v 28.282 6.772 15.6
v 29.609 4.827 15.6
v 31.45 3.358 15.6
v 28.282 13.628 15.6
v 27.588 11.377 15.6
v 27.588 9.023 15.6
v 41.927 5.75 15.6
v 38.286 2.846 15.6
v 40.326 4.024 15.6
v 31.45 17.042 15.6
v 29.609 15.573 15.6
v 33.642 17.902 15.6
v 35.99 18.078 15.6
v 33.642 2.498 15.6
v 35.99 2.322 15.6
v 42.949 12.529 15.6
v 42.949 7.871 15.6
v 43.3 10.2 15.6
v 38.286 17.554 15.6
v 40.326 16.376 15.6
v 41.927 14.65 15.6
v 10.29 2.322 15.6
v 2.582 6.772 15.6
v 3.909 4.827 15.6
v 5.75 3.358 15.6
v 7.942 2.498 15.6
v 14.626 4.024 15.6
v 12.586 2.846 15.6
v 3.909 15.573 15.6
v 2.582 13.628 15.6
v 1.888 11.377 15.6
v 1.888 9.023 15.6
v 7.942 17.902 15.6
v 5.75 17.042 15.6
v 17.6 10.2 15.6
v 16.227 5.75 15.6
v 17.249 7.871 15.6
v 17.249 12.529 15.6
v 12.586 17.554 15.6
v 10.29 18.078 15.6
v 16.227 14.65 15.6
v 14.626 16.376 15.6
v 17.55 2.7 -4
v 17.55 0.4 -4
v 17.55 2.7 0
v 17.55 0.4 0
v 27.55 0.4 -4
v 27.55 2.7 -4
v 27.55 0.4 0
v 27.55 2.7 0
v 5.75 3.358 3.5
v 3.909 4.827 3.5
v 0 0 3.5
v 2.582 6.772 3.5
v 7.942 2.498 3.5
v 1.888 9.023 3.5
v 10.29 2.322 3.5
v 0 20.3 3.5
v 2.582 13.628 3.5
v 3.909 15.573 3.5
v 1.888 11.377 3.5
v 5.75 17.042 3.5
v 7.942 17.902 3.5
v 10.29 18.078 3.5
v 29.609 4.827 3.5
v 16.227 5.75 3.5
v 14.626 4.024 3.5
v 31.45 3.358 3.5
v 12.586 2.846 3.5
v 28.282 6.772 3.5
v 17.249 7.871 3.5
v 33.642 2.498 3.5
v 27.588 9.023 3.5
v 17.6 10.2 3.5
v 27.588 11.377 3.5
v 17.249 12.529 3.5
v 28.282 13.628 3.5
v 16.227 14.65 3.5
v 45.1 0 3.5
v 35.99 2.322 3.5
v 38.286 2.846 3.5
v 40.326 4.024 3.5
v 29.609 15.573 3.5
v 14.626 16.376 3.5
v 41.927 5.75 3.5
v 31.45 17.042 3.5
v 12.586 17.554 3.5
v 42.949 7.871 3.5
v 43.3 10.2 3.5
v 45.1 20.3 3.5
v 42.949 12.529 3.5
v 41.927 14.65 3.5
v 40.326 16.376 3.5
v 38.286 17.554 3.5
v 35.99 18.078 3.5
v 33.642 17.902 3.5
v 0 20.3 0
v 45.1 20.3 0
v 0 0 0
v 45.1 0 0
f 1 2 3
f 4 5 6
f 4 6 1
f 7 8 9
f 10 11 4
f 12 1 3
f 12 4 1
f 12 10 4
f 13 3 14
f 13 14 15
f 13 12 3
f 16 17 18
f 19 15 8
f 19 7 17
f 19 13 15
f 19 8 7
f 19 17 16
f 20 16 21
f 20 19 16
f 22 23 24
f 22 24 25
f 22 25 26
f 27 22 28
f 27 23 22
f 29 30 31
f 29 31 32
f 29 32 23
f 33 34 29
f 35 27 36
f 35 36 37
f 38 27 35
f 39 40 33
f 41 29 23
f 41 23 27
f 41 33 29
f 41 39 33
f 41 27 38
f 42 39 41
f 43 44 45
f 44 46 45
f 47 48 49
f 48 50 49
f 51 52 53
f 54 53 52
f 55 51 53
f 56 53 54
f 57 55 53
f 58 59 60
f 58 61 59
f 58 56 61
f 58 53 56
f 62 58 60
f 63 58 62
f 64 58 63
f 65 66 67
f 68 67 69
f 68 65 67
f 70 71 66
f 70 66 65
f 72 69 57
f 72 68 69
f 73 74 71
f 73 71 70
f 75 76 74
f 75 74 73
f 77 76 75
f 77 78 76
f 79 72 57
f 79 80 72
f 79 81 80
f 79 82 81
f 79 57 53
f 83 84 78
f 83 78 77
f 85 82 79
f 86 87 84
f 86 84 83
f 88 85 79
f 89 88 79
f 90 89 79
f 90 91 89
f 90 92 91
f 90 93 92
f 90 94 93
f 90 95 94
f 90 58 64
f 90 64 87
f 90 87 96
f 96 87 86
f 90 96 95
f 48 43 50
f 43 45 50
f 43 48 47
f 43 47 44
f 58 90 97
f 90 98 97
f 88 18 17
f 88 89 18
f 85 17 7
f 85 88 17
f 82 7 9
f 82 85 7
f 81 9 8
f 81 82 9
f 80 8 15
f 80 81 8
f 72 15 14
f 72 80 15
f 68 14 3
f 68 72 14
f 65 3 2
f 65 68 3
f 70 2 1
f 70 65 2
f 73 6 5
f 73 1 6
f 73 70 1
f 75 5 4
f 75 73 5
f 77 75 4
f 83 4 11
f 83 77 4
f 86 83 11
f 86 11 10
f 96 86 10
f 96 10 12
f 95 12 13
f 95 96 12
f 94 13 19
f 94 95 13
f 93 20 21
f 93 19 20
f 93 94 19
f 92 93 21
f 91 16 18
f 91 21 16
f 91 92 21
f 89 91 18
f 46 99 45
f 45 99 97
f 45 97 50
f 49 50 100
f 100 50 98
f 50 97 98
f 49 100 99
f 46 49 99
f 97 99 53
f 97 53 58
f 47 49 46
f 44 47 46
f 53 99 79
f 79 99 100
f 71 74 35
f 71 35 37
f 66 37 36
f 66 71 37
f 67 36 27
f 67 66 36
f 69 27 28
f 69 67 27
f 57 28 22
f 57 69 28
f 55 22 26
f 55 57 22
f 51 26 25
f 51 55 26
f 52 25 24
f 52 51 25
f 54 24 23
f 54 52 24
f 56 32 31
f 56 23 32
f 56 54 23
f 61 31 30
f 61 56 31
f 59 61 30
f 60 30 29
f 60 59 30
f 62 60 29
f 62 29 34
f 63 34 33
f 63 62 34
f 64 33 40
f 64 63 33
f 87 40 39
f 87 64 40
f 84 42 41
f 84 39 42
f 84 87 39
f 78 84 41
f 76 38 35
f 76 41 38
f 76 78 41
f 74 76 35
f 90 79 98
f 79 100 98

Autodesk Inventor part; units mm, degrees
ref_plane "YZ Plane" through (0, 0, 0) normal (1, 0, 0) x (0, 1, 0)
ref_plane "XZ Plane" through (0, 0, 0) normal (0, 1, 0) x (-1, 0, 0)
ref_plane "XY Plane" through (0, 0, 0) normal (0, 0, 1) x (1, 0, 0)
sketch "Skizze1" plane through (0, 0, 0) normal (0, 0, 1) x (1, 0, 0)
  line L0 (-9.02, 0) -> (54.12, 0) projected
  line L1 (0, -4.06) -> (0, 24.36) projected
  line L2 (0, 0) -> (45.1, 0)
  line L3 (45.1, 0) -> (45.1, 20.3)
  line L4 (45.1, 20.3) -> (0, 20.3)
  line L5 (0, 20.3) -> (0, 0)
  point P0 (0, 20.3)
  dimension "d0" = 20.3
  dimension "d1" = 45.1
extrude "Extrusion1" add sketch "Skizze1" along normal blind 3.5
sketch "Skizze2" plane through (0, 0, 3.5) normal (0, 0, 1) x (1, 0, 0)
  circle A0 centre (35.4, 10.2) radius 7.9
  circle A1 centre (9.7, 10.2) radius 7.9
  line L0 (0, 20.3) -> (0, 0) projected
  line L1 (0, 0) -> (45.1, 0) projected
  dimension "d4" = 15.8
  dimension "d5" = 15.8
  dimension "d6" = 25.7
  dimension "d8" = 9.7
  dimension "d9" = 10.2
  dimension "d10" = 10.2
extrude "Extrusion2" add sketch "Skizze2" along normal blind 12.1
sketch "Skizze3" plane through (0, 0, 0) normal (0, 0, -1) x (-1, 0, 0)
  line L0 (-17.55, 2.7) -> (-27.55, 2.7)
  line L1 (-27.55, 2.7) -> (-27.55, 0.4)
  line L2 (-27.55, 0.4) -> (-17.55, 0.4)
  line L3 (-17.55, 0.4) -> (-17.55, 2.7)
  line L4 (0, 0) -> (-45.1, 0) projected
  line L5 (-45.1, 0) -> (-45.1, 20.3) projected
  dimension "d13" = 2.7
  dimension "d14" = 2.3
  dimension "d17" = 10
  dimension "d18" = 17.55
extrude "Extrusion3" add sketch "Skizze3" along normal blind 4
properties part number "Sensor_Dummy"
